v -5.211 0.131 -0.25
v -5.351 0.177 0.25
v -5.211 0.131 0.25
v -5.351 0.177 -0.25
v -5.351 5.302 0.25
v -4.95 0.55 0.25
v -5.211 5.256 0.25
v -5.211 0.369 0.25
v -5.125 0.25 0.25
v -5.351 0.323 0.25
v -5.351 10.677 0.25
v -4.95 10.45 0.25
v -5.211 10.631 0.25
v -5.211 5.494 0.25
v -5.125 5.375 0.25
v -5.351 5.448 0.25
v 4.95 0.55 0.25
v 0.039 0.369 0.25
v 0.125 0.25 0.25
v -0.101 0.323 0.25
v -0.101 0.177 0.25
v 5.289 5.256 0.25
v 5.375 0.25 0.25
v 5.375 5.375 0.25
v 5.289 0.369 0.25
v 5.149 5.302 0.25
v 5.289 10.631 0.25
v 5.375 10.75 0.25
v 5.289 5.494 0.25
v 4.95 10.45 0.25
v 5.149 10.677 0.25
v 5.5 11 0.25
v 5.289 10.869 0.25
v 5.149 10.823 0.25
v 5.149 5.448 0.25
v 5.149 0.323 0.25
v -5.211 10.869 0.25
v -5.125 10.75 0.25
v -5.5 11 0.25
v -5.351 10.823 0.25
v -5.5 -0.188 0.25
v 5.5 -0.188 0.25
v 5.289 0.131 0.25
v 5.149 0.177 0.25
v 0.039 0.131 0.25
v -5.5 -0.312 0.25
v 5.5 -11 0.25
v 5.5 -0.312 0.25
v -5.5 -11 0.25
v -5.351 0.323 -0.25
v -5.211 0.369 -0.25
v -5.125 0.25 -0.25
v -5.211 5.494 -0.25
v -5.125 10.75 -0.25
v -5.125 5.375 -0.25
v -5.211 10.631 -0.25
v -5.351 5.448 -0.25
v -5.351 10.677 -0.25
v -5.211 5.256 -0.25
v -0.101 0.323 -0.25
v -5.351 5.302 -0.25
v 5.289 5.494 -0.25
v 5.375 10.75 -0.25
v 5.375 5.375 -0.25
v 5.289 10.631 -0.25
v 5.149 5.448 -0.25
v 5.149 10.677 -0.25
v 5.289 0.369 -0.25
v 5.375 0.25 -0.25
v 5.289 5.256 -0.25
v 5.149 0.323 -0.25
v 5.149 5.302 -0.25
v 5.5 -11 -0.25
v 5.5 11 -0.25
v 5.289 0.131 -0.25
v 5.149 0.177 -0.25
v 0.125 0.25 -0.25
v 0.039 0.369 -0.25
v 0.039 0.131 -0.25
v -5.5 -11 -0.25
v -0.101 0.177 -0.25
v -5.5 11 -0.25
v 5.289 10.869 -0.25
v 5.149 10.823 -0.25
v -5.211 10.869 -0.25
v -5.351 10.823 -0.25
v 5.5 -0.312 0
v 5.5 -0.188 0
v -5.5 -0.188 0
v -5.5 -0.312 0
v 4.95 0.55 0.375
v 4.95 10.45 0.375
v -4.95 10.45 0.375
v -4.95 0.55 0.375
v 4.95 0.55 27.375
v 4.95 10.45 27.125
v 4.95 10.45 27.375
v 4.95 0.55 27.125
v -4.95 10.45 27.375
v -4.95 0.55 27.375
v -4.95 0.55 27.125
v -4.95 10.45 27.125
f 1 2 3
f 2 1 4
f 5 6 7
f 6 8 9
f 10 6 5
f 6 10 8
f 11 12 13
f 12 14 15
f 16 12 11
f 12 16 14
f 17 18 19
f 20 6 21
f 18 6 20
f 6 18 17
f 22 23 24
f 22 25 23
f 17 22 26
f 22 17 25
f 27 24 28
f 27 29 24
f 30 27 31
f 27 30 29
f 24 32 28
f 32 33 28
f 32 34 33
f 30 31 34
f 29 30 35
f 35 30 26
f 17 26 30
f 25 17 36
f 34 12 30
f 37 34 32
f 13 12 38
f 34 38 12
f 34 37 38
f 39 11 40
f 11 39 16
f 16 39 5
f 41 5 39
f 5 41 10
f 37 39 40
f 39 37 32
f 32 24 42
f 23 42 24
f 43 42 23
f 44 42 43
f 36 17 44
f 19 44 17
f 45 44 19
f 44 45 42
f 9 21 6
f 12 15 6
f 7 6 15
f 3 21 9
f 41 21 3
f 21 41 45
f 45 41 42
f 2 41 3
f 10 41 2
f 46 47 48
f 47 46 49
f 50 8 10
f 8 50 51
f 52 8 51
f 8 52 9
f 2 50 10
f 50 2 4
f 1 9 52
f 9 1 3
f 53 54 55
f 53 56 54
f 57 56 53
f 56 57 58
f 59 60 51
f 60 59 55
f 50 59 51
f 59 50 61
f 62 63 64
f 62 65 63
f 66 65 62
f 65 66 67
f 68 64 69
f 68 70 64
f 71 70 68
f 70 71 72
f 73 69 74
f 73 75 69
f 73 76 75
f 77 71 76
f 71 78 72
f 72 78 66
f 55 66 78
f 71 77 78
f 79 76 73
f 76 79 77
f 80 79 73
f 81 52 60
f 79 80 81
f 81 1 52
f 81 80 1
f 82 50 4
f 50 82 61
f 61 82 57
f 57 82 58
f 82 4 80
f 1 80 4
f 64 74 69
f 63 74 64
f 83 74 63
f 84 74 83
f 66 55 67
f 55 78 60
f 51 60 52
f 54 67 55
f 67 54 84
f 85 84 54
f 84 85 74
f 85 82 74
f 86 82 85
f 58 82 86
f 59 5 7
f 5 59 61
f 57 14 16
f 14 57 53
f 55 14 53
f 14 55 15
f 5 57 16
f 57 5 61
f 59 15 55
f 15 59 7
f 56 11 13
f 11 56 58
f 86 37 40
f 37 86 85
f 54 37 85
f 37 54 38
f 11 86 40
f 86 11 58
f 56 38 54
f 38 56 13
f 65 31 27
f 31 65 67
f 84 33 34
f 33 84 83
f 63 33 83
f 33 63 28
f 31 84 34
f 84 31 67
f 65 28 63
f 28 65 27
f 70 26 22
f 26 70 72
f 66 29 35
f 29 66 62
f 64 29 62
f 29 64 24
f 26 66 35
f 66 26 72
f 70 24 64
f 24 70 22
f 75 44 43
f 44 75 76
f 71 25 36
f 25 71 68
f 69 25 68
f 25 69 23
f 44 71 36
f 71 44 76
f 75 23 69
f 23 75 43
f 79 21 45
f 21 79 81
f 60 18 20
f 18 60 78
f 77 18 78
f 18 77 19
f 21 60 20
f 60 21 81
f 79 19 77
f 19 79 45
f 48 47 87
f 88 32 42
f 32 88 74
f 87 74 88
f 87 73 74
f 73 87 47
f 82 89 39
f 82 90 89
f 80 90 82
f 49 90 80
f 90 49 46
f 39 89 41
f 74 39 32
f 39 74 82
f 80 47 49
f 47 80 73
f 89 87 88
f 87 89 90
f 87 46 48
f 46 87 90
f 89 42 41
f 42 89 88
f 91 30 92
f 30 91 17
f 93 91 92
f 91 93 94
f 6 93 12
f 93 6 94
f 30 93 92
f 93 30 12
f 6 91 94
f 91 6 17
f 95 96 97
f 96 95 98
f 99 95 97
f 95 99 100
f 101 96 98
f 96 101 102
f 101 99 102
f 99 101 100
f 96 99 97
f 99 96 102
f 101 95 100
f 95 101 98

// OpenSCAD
width = 11;
half_width = width / 2;

thickness = 0.5;
half_thickness = thickness / 2;
quarter_thickness = thickness / 4;

heigth = 27;

module base() {
  module inset() {
    rotate([90, 90, 0]) {
      translate([-half_thickness,
                 0,
                 half_thickness])
{
        cube([thickness, 
              width + thickness, 
              quarter_thickness], 
             center=true);
      }
    }
  }
  
  module holes() {
    module hole() {
      cylinder(h = thickness, 
               r1 = quarter_thickness, 
               r2 = quarter_thickness, 
               center = true);
    }

    translate([(-width / 2) + half_thickness, half_thickness]) hole();
    translate([(-width / 2) + half_thickness, (width - half_thickness) / 2]) hole();
    translate([(-width / 2) + half_thickness, width - half_thickness, 0]) hole();
    
    translate([(width / 2) - half_thickness, width - half_thickness, 0]) hole();
    translate([(width / 2) - half_thickness, (width - half_thickness) / 2, 0]) hole();
    translate([(width / 2) - half_thickness, half_thickness, 0]) hole();
    
    translate([0, half_thickness, 0]) hole();
  }
  
    
  difference() {
    cube([width, width * 2, thickness], center = true);
    inset();
    holes();
  }
}

module cabin() {
  module slab() {
    cube([width * 0.9, width * 0.9, half_thickness], center = true);
  }
  
  module ceiling() {
    translate([0, half_width, half_thickness + heigth])
    slab();
  }

  module floor() {
    translate([0, half_width, half_thickness])
    slab();
  }
  
  color([0.3, 0, 0])
  union() {
    floor();
    ceiling();
  }

}

function cabin_heigth(t) = t < 0.5 ? t * (heigth * 4.5) : (1 - $t) * (heigth * 4.5);

module house() {
  translate([0,
             -half_thickness,
             heigth * 4.5 / 2])
  union() {
    color("gray", 0.5)
    cube([25,
          quarter_thickness,
          heigth * 4.5],
         center=true);
  }
}

module elevator() {
  union() {
    base();
//    house();

    translate([0, 0, cabin_heigth($t)])
    cabin();
  }
}

elevator();
